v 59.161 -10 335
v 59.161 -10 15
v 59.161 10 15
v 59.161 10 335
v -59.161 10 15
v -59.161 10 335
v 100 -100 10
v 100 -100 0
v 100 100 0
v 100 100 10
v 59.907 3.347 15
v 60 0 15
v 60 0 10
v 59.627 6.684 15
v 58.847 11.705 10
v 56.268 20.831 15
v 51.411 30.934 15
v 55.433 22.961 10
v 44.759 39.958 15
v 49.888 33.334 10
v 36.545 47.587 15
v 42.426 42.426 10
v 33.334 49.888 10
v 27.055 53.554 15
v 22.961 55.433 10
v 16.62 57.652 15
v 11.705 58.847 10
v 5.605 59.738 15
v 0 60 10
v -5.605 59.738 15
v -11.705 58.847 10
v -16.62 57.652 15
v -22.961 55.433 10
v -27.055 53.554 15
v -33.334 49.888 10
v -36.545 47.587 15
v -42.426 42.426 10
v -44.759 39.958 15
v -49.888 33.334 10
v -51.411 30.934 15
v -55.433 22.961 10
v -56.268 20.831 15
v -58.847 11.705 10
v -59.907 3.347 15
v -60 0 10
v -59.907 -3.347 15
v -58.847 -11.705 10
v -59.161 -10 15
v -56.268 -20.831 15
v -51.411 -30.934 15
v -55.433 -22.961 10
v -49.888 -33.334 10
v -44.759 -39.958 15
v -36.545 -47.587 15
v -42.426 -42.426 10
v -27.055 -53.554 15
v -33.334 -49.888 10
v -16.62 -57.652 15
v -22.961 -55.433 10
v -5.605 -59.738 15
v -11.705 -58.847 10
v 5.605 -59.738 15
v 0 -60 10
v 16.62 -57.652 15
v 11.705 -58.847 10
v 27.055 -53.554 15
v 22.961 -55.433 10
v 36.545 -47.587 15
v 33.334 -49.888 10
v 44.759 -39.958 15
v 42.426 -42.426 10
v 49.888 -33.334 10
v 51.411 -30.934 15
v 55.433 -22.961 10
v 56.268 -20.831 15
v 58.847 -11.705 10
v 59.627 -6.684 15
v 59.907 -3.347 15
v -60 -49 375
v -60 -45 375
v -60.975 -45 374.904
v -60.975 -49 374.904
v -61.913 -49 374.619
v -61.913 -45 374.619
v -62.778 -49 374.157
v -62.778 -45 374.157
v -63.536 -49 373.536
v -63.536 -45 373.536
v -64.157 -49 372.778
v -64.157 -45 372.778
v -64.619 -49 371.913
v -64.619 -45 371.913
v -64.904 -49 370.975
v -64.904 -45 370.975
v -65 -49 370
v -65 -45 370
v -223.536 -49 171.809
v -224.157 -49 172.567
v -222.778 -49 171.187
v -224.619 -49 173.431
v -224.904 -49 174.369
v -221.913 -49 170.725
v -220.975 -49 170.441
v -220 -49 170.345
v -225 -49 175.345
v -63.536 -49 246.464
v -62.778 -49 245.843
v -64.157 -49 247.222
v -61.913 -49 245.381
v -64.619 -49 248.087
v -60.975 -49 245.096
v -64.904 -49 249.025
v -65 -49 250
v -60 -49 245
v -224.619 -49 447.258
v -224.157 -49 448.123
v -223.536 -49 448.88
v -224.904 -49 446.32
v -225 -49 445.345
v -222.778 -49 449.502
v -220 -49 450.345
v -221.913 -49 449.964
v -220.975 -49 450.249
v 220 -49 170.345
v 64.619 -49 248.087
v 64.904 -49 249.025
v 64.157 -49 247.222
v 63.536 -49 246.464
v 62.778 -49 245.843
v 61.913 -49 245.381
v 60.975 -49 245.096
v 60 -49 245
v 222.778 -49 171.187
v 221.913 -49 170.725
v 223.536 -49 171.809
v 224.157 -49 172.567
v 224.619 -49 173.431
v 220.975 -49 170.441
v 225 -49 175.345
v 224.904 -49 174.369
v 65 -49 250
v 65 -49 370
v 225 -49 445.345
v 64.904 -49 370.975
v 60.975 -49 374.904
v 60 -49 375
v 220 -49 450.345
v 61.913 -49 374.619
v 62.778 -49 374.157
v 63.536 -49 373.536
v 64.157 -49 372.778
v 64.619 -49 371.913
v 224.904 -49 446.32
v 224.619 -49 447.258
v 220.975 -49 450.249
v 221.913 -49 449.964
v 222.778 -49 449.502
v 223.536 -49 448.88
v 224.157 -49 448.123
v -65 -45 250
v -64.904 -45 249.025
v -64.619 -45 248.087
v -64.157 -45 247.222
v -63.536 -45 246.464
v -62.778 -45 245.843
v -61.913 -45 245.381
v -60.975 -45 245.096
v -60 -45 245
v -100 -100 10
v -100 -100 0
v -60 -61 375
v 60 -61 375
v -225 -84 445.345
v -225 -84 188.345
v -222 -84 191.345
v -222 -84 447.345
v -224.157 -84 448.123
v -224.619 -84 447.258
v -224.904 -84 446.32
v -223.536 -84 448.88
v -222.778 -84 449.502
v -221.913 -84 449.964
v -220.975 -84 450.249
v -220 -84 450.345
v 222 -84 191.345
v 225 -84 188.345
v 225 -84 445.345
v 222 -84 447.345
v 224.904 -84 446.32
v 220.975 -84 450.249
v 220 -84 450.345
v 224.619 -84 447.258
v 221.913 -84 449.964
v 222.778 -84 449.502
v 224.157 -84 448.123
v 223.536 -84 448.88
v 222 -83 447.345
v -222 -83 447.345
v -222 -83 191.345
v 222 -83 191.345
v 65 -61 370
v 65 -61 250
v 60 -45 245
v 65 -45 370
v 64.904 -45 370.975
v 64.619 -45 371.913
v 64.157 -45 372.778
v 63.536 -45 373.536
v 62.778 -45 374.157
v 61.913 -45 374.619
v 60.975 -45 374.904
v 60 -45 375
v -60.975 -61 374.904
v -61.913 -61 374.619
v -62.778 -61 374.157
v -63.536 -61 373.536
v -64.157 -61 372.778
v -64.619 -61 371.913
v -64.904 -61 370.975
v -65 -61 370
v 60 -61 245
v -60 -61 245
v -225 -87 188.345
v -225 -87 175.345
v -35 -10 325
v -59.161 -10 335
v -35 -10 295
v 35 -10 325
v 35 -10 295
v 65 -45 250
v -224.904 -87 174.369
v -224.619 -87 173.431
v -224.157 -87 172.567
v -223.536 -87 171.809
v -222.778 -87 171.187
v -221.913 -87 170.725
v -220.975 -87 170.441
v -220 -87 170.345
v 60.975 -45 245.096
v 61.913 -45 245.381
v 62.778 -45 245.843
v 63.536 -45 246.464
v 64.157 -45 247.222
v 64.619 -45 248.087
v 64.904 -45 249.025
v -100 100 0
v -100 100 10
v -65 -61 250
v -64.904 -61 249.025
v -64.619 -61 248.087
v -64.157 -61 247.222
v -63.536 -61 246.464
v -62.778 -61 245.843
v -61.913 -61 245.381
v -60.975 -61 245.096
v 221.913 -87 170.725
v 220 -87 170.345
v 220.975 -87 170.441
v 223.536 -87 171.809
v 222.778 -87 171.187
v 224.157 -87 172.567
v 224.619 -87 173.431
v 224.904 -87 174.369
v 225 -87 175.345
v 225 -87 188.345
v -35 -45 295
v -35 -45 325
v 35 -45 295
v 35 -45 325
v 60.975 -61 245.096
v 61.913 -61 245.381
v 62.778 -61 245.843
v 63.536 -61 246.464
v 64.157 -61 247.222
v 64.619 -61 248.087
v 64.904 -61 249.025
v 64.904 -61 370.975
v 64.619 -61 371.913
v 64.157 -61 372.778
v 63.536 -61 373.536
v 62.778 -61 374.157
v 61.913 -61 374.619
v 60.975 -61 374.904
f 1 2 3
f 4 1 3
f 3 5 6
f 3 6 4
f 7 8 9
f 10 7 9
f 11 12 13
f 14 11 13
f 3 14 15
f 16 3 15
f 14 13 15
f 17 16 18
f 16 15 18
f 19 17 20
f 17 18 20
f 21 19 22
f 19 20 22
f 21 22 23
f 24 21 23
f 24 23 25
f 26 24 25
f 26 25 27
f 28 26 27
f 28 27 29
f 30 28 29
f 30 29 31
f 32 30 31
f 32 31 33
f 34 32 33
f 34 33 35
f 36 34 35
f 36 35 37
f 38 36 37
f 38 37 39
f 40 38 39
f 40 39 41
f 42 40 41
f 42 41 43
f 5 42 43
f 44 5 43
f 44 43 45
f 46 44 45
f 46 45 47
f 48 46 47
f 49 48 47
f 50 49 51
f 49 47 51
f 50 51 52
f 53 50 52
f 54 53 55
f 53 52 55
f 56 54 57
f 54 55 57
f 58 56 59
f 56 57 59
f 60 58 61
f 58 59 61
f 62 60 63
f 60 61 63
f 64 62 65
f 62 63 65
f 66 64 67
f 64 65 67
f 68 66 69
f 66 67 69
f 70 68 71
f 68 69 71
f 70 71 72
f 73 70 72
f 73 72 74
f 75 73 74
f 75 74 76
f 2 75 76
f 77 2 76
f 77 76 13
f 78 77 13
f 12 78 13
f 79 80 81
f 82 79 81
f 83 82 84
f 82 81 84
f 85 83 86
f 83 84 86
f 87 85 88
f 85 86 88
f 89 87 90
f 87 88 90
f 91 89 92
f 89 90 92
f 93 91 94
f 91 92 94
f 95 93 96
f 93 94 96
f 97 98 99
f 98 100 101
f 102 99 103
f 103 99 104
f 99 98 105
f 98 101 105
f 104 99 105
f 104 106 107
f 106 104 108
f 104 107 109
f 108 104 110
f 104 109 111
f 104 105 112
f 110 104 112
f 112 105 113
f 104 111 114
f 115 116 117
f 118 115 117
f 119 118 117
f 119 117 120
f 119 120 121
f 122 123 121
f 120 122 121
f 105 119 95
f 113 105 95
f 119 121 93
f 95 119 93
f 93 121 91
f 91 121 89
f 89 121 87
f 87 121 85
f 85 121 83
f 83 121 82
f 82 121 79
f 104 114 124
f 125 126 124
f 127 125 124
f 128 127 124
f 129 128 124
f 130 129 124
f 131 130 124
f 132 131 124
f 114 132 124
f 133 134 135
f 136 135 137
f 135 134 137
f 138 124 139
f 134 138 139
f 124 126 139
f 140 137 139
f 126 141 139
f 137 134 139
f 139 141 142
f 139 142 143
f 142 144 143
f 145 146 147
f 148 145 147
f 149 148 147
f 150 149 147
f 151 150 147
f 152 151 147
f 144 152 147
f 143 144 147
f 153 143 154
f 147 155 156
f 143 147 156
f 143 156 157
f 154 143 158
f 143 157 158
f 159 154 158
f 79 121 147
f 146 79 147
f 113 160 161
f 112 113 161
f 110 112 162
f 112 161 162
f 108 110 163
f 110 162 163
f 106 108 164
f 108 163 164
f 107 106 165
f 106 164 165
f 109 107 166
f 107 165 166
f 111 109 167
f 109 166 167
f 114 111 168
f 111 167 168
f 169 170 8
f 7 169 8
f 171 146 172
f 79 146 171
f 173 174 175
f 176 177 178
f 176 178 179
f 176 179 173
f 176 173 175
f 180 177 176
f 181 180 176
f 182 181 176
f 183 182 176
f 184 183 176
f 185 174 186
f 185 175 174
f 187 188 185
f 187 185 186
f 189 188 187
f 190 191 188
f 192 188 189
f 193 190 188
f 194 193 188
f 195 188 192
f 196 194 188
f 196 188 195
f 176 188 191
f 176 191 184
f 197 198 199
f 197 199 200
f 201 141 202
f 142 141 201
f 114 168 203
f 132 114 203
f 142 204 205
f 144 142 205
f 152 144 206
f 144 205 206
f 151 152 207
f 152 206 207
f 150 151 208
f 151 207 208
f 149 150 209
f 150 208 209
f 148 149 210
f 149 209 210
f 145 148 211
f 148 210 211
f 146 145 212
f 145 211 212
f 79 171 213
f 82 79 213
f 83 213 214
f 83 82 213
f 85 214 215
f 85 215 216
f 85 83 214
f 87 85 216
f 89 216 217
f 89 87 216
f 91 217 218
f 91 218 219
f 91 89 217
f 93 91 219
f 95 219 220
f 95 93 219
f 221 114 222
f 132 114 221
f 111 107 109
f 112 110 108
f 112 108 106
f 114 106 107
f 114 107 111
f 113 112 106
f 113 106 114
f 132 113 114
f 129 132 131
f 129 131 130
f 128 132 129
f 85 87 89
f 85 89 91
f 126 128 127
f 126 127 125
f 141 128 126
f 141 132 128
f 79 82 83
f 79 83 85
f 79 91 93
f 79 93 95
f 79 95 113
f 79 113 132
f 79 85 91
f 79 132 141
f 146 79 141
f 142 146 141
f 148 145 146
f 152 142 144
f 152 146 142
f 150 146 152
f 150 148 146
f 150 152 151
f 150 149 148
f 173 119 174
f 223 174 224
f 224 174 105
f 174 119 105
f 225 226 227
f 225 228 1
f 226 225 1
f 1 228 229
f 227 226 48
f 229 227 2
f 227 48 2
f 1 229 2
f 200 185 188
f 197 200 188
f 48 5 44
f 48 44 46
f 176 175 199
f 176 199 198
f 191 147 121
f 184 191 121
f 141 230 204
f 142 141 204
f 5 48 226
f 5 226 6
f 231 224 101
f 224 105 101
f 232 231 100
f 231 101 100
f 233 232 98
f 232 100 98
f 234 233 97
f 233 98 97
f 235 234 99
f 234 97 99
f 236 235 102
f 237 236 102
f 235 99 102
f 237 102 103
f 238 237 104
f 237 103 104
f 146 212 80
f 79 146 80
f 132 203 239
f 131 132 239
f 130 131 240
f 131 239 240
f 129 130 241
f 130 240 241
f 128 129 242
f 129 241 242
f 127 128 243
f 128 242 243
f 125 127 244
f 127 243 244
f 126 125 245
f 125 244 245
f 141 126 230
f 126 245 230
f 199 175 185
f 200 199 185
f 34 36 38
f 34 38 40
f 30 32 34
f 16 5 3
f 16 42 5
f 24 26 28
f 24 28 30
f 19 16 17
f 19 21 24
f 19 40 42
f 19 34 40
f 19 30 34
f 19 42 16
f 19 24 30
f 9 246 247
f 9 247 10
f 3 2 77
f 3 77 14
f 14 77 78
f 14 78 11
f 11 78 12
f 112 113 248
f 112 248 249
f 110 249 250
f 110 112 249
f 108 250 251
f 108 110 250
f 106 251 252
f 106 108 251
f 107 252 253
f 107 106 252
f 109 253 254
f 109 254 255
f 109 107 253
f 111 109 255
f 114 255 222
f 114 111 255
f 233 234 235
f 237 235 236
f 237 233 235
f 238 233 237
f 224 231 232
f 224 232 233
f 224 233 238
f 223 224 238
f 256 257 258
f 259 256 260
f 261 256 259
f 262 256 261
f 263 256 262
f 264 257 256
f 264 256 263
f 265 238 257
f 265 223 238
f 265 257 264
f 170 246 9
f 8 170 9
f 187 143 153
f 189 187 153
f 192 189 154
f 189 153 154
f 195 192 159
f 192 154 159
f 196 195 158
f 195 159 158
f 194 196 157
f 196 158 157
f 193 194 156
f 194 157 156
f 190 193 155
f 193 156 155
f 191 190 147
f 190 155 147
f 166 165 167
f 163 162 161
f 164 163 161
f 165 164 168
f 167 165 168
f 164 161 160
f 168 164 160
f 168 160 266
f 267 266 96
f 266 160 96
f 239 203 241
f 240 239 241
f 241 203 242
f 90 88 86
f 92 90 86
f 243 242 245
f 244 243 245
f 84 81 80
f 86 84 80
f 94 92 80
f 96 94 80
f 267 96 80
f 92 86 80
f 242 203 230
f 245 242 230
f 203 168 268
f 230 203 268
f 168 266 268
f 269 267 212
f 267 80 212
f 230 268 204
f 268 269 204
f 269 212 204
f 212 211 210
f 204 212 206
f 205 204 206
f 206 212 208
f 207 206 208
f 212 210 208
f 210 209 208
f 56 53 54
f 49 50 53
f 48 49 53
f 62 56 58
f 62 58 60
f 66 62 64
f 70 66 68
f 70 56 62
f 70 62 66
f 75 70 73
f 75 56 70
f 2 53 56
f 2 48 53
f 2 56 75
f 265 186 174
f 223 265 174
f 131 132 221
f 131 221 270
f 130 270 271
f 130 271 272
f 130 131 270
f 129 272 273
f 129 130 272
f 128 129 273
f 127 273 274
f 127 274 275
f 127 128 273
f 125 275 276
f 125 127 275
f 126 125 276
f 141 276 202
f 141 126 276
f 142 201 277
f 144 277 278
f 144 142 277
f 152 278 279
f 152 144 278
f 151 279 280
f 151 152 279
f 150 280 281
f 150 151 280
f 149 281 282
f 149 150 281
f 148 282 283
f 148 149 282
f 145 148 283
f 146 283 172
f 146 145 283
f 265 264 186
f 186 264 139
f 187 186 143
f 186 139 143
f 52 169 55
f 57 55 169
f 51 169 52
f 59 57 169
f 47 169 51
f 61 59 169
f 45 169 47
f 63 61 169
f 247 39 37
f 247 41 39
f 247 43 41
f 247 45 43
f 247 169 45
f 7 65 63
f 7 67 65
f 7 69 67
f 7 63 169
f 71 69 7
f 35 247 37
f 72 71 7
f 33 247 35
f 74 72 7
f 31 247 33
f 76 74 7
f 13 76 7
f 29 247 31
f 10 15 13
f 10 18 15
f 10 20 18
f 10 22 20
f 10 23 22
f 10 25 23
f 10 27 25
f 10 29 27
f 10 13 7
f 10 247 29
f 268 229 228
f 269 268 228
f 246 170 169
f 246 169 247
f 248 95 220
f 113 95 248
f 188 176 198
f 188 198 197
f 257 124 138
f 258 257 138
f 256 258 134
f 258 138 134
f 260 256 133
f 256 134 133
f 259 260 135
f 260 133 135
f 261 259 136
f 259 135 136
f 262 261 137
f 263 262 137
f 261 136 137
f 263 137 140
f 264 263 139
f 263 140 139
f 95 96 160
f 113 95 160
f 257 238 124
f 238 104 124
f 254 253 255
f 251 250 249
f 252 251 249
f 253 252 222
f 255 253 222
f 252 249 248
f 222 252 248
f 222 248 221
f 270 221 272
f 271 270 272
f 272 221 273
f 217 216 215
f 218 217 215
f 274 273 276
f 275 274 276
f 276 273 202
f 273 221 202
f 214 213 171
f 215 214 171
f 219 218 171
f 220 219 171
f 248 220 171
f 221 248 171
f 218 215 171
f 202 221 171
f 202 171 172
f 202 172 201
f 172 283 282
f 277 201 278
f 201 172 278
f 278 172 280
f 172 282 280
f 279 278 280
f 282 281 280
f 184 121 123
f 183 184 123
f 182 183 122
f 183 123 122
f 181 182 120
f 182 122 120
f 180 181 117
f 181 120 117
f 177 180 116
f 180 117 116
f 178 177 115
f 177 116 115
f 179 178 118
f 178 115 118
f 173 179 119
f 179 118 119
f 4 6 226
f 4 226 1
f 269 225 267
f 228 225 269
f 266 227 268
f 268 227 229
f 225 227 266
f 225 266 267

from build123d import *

# Parameters (mm, degrees)
F0_W      = 200
F0_H      = 200
F1_DEPTH  = 10
F2_R      = 60
F3_DEPTH  = 5
F4_W      = 118.321595662
F4_H      = 20
F5_DEPTH  = 320
F6_W      = 70
F6_H      = 30
F7_DEPTH  = 35
F9_DEPTH  = 4
F11_DEPTH = 35
F8_W      = 70
F8_H      = 30
F12_DEPTH = 16
F14_DEPTH = 3
F15_W     = 444
F15_H     = 256
F16_DEPTH = 1


with BuildPart() as f1:
    # F0 (on Top) → F1 (new body)
    with BuildSketch(Plane.XY):
        Rectangle(F0_W, F0_H)
    extrude(amount=F1_DEPTH)

    # F2 (on face) → F3 (join)
    with BuildSketch(Plane.XY.offset(10)):
        Circle(F2_R)
    extrude(amount=F3_DEPTH)

    # F4 (on face) → F5 (join)
    with BuildSketch(Plane.XY.offset(15)):
        Rectangle(F4_W, F4_H)
    extrude(amount=F5_DEPTH)

    # F6 (on face) → F7 (join)
    with BuildSketch(Plane.XZ.offset(10)):
        with Locations((0, 310)):
            Rectangle(F6_W, F6_H)
    extrude(amount=F7_DEPTH)

    # F8 (on face) → F9 (join)
    with BuildSketch(Plane.XZ.offset(45)):
        with BuildLine():
            Line((-60, 245), (60, 245))
            ThreePointArc((60, 245), (63.5355339059, 246.4644660941), (65, 250))
            Line((65, 250), (65, 370))
            ThreePointArc((65, 370), (63.5355339059, 373.5355339059), (60, 375))
            Line((60, 375), (-60, 375))
            ThreePointArc((-60, 375), (-63.5355339059, 373.5355339059), (-65, 370))
            Line((-65, 370), (-65, 250))
            ThreePointArc((-65, 250), (-63.5355339059, 246.4644660941), (-60, 245))
        make_face()
    extrude(amount=F9_DEPTH)


with BuildPart() as f11:
    # F10 (on face) → F11 (new body)
    with BuildSketch(Plane.XZ.offset(49)):
        with BuildLine():
            ThreePointArc((-225, 175.3447556496), (-223.5355339059, 171.8092217436), (-220, 170.3447556496))
            Line((-220, 170.3447556496), (220, 170.3447556496))
            ThreePointArc((220, 170.3447556496), (223.5355339059, 171.8092217436), (225, 175.3447556496))
            Line((225, 175.3447556496), (225, 445.3447556496))
            ThreePointArc((225, 445.3447556496), (223.5355339059, 448.8802895555), (220, 450.3447556496))
            Line((220, 450.3447556496), (-220, 450.3447556496))
            ThreePointArc((-220, 450.3447556496), (-223.5355339059, 448.8802895555), (-225, 445.3447556496))
            Line((-225, 445.3447556496), (-225, 175.3447556496))
        make_face()
    extrude(amount=F11_DEPTH)

    # F8 (on face) → F12 (cut)
    with BuildSketch(Plane.XZ.offset(45)):
        with BuildLine():
            Line((-60, 245), (60, 245))
            ThreePointArc((60, 245), (63.5355339059, 246.4644660941), (65, 250))
            Line((65, 250), (65, 370))
            ThreePointArc((65, 370), (63.5355339059, 373.5355339059), (60, 375))
            Line((60, 375), (-60, 375))
            ThreePointArc((-60, 375), (-63.5355339059, 373.5355339059), (-65, 370))
            Line((-65, 370), (-65, 250))
            ThreePointArc((-65, 250), (-63.5355339059, 246.4644660941), (-60, 245))
        make_face()
        with Locations((0, 310)):
            Rectangle(F8_W, F8_H, mode=Mode.SUBTRACT)
        with Locations((0, 310)):
            Rectangle(F8_W, F8_H)
    extrude(amount=F12_DEPTH, mode=Mode.SUBTRACT)

    # F13 (on face) → F14 (join)
    with BuildSketch(Plane.XZ.offset(84)):
        with BuildLine():
            Line((225, 188.3447556496), (-225, 188.3447556496))
            Line((-225, 188.3447556496), (-225, 175.3447556496))
            ThreePointArc((-225, 175.3447556496), (-223.5355339059, 171.8092217436), (-220, 170.3447556496))
            Line((-220, 170.3447556496), (220, 170.3447556496))
            ThreePointArc((220, 170.3447556496), (223.5355339059, 171.8092217436), (225, 175.3447556496))
            Line((225, 175.3447556496), (225, 188.3447556496))
        make_face()
    extrude(amount=F14_DEPTH)

    # F15 (on face) → F16 (cut)
    with BuildSketch(Plane.XZ.offset(84)):
        with Locations((0, 319.3447556496)):
            Rectangle(F15_W, F15_H)
    extrude(amount=-F16_DEPTH, mode=Mode.SUBTRACT)


solid = Compound([f1.part, f11.part])
